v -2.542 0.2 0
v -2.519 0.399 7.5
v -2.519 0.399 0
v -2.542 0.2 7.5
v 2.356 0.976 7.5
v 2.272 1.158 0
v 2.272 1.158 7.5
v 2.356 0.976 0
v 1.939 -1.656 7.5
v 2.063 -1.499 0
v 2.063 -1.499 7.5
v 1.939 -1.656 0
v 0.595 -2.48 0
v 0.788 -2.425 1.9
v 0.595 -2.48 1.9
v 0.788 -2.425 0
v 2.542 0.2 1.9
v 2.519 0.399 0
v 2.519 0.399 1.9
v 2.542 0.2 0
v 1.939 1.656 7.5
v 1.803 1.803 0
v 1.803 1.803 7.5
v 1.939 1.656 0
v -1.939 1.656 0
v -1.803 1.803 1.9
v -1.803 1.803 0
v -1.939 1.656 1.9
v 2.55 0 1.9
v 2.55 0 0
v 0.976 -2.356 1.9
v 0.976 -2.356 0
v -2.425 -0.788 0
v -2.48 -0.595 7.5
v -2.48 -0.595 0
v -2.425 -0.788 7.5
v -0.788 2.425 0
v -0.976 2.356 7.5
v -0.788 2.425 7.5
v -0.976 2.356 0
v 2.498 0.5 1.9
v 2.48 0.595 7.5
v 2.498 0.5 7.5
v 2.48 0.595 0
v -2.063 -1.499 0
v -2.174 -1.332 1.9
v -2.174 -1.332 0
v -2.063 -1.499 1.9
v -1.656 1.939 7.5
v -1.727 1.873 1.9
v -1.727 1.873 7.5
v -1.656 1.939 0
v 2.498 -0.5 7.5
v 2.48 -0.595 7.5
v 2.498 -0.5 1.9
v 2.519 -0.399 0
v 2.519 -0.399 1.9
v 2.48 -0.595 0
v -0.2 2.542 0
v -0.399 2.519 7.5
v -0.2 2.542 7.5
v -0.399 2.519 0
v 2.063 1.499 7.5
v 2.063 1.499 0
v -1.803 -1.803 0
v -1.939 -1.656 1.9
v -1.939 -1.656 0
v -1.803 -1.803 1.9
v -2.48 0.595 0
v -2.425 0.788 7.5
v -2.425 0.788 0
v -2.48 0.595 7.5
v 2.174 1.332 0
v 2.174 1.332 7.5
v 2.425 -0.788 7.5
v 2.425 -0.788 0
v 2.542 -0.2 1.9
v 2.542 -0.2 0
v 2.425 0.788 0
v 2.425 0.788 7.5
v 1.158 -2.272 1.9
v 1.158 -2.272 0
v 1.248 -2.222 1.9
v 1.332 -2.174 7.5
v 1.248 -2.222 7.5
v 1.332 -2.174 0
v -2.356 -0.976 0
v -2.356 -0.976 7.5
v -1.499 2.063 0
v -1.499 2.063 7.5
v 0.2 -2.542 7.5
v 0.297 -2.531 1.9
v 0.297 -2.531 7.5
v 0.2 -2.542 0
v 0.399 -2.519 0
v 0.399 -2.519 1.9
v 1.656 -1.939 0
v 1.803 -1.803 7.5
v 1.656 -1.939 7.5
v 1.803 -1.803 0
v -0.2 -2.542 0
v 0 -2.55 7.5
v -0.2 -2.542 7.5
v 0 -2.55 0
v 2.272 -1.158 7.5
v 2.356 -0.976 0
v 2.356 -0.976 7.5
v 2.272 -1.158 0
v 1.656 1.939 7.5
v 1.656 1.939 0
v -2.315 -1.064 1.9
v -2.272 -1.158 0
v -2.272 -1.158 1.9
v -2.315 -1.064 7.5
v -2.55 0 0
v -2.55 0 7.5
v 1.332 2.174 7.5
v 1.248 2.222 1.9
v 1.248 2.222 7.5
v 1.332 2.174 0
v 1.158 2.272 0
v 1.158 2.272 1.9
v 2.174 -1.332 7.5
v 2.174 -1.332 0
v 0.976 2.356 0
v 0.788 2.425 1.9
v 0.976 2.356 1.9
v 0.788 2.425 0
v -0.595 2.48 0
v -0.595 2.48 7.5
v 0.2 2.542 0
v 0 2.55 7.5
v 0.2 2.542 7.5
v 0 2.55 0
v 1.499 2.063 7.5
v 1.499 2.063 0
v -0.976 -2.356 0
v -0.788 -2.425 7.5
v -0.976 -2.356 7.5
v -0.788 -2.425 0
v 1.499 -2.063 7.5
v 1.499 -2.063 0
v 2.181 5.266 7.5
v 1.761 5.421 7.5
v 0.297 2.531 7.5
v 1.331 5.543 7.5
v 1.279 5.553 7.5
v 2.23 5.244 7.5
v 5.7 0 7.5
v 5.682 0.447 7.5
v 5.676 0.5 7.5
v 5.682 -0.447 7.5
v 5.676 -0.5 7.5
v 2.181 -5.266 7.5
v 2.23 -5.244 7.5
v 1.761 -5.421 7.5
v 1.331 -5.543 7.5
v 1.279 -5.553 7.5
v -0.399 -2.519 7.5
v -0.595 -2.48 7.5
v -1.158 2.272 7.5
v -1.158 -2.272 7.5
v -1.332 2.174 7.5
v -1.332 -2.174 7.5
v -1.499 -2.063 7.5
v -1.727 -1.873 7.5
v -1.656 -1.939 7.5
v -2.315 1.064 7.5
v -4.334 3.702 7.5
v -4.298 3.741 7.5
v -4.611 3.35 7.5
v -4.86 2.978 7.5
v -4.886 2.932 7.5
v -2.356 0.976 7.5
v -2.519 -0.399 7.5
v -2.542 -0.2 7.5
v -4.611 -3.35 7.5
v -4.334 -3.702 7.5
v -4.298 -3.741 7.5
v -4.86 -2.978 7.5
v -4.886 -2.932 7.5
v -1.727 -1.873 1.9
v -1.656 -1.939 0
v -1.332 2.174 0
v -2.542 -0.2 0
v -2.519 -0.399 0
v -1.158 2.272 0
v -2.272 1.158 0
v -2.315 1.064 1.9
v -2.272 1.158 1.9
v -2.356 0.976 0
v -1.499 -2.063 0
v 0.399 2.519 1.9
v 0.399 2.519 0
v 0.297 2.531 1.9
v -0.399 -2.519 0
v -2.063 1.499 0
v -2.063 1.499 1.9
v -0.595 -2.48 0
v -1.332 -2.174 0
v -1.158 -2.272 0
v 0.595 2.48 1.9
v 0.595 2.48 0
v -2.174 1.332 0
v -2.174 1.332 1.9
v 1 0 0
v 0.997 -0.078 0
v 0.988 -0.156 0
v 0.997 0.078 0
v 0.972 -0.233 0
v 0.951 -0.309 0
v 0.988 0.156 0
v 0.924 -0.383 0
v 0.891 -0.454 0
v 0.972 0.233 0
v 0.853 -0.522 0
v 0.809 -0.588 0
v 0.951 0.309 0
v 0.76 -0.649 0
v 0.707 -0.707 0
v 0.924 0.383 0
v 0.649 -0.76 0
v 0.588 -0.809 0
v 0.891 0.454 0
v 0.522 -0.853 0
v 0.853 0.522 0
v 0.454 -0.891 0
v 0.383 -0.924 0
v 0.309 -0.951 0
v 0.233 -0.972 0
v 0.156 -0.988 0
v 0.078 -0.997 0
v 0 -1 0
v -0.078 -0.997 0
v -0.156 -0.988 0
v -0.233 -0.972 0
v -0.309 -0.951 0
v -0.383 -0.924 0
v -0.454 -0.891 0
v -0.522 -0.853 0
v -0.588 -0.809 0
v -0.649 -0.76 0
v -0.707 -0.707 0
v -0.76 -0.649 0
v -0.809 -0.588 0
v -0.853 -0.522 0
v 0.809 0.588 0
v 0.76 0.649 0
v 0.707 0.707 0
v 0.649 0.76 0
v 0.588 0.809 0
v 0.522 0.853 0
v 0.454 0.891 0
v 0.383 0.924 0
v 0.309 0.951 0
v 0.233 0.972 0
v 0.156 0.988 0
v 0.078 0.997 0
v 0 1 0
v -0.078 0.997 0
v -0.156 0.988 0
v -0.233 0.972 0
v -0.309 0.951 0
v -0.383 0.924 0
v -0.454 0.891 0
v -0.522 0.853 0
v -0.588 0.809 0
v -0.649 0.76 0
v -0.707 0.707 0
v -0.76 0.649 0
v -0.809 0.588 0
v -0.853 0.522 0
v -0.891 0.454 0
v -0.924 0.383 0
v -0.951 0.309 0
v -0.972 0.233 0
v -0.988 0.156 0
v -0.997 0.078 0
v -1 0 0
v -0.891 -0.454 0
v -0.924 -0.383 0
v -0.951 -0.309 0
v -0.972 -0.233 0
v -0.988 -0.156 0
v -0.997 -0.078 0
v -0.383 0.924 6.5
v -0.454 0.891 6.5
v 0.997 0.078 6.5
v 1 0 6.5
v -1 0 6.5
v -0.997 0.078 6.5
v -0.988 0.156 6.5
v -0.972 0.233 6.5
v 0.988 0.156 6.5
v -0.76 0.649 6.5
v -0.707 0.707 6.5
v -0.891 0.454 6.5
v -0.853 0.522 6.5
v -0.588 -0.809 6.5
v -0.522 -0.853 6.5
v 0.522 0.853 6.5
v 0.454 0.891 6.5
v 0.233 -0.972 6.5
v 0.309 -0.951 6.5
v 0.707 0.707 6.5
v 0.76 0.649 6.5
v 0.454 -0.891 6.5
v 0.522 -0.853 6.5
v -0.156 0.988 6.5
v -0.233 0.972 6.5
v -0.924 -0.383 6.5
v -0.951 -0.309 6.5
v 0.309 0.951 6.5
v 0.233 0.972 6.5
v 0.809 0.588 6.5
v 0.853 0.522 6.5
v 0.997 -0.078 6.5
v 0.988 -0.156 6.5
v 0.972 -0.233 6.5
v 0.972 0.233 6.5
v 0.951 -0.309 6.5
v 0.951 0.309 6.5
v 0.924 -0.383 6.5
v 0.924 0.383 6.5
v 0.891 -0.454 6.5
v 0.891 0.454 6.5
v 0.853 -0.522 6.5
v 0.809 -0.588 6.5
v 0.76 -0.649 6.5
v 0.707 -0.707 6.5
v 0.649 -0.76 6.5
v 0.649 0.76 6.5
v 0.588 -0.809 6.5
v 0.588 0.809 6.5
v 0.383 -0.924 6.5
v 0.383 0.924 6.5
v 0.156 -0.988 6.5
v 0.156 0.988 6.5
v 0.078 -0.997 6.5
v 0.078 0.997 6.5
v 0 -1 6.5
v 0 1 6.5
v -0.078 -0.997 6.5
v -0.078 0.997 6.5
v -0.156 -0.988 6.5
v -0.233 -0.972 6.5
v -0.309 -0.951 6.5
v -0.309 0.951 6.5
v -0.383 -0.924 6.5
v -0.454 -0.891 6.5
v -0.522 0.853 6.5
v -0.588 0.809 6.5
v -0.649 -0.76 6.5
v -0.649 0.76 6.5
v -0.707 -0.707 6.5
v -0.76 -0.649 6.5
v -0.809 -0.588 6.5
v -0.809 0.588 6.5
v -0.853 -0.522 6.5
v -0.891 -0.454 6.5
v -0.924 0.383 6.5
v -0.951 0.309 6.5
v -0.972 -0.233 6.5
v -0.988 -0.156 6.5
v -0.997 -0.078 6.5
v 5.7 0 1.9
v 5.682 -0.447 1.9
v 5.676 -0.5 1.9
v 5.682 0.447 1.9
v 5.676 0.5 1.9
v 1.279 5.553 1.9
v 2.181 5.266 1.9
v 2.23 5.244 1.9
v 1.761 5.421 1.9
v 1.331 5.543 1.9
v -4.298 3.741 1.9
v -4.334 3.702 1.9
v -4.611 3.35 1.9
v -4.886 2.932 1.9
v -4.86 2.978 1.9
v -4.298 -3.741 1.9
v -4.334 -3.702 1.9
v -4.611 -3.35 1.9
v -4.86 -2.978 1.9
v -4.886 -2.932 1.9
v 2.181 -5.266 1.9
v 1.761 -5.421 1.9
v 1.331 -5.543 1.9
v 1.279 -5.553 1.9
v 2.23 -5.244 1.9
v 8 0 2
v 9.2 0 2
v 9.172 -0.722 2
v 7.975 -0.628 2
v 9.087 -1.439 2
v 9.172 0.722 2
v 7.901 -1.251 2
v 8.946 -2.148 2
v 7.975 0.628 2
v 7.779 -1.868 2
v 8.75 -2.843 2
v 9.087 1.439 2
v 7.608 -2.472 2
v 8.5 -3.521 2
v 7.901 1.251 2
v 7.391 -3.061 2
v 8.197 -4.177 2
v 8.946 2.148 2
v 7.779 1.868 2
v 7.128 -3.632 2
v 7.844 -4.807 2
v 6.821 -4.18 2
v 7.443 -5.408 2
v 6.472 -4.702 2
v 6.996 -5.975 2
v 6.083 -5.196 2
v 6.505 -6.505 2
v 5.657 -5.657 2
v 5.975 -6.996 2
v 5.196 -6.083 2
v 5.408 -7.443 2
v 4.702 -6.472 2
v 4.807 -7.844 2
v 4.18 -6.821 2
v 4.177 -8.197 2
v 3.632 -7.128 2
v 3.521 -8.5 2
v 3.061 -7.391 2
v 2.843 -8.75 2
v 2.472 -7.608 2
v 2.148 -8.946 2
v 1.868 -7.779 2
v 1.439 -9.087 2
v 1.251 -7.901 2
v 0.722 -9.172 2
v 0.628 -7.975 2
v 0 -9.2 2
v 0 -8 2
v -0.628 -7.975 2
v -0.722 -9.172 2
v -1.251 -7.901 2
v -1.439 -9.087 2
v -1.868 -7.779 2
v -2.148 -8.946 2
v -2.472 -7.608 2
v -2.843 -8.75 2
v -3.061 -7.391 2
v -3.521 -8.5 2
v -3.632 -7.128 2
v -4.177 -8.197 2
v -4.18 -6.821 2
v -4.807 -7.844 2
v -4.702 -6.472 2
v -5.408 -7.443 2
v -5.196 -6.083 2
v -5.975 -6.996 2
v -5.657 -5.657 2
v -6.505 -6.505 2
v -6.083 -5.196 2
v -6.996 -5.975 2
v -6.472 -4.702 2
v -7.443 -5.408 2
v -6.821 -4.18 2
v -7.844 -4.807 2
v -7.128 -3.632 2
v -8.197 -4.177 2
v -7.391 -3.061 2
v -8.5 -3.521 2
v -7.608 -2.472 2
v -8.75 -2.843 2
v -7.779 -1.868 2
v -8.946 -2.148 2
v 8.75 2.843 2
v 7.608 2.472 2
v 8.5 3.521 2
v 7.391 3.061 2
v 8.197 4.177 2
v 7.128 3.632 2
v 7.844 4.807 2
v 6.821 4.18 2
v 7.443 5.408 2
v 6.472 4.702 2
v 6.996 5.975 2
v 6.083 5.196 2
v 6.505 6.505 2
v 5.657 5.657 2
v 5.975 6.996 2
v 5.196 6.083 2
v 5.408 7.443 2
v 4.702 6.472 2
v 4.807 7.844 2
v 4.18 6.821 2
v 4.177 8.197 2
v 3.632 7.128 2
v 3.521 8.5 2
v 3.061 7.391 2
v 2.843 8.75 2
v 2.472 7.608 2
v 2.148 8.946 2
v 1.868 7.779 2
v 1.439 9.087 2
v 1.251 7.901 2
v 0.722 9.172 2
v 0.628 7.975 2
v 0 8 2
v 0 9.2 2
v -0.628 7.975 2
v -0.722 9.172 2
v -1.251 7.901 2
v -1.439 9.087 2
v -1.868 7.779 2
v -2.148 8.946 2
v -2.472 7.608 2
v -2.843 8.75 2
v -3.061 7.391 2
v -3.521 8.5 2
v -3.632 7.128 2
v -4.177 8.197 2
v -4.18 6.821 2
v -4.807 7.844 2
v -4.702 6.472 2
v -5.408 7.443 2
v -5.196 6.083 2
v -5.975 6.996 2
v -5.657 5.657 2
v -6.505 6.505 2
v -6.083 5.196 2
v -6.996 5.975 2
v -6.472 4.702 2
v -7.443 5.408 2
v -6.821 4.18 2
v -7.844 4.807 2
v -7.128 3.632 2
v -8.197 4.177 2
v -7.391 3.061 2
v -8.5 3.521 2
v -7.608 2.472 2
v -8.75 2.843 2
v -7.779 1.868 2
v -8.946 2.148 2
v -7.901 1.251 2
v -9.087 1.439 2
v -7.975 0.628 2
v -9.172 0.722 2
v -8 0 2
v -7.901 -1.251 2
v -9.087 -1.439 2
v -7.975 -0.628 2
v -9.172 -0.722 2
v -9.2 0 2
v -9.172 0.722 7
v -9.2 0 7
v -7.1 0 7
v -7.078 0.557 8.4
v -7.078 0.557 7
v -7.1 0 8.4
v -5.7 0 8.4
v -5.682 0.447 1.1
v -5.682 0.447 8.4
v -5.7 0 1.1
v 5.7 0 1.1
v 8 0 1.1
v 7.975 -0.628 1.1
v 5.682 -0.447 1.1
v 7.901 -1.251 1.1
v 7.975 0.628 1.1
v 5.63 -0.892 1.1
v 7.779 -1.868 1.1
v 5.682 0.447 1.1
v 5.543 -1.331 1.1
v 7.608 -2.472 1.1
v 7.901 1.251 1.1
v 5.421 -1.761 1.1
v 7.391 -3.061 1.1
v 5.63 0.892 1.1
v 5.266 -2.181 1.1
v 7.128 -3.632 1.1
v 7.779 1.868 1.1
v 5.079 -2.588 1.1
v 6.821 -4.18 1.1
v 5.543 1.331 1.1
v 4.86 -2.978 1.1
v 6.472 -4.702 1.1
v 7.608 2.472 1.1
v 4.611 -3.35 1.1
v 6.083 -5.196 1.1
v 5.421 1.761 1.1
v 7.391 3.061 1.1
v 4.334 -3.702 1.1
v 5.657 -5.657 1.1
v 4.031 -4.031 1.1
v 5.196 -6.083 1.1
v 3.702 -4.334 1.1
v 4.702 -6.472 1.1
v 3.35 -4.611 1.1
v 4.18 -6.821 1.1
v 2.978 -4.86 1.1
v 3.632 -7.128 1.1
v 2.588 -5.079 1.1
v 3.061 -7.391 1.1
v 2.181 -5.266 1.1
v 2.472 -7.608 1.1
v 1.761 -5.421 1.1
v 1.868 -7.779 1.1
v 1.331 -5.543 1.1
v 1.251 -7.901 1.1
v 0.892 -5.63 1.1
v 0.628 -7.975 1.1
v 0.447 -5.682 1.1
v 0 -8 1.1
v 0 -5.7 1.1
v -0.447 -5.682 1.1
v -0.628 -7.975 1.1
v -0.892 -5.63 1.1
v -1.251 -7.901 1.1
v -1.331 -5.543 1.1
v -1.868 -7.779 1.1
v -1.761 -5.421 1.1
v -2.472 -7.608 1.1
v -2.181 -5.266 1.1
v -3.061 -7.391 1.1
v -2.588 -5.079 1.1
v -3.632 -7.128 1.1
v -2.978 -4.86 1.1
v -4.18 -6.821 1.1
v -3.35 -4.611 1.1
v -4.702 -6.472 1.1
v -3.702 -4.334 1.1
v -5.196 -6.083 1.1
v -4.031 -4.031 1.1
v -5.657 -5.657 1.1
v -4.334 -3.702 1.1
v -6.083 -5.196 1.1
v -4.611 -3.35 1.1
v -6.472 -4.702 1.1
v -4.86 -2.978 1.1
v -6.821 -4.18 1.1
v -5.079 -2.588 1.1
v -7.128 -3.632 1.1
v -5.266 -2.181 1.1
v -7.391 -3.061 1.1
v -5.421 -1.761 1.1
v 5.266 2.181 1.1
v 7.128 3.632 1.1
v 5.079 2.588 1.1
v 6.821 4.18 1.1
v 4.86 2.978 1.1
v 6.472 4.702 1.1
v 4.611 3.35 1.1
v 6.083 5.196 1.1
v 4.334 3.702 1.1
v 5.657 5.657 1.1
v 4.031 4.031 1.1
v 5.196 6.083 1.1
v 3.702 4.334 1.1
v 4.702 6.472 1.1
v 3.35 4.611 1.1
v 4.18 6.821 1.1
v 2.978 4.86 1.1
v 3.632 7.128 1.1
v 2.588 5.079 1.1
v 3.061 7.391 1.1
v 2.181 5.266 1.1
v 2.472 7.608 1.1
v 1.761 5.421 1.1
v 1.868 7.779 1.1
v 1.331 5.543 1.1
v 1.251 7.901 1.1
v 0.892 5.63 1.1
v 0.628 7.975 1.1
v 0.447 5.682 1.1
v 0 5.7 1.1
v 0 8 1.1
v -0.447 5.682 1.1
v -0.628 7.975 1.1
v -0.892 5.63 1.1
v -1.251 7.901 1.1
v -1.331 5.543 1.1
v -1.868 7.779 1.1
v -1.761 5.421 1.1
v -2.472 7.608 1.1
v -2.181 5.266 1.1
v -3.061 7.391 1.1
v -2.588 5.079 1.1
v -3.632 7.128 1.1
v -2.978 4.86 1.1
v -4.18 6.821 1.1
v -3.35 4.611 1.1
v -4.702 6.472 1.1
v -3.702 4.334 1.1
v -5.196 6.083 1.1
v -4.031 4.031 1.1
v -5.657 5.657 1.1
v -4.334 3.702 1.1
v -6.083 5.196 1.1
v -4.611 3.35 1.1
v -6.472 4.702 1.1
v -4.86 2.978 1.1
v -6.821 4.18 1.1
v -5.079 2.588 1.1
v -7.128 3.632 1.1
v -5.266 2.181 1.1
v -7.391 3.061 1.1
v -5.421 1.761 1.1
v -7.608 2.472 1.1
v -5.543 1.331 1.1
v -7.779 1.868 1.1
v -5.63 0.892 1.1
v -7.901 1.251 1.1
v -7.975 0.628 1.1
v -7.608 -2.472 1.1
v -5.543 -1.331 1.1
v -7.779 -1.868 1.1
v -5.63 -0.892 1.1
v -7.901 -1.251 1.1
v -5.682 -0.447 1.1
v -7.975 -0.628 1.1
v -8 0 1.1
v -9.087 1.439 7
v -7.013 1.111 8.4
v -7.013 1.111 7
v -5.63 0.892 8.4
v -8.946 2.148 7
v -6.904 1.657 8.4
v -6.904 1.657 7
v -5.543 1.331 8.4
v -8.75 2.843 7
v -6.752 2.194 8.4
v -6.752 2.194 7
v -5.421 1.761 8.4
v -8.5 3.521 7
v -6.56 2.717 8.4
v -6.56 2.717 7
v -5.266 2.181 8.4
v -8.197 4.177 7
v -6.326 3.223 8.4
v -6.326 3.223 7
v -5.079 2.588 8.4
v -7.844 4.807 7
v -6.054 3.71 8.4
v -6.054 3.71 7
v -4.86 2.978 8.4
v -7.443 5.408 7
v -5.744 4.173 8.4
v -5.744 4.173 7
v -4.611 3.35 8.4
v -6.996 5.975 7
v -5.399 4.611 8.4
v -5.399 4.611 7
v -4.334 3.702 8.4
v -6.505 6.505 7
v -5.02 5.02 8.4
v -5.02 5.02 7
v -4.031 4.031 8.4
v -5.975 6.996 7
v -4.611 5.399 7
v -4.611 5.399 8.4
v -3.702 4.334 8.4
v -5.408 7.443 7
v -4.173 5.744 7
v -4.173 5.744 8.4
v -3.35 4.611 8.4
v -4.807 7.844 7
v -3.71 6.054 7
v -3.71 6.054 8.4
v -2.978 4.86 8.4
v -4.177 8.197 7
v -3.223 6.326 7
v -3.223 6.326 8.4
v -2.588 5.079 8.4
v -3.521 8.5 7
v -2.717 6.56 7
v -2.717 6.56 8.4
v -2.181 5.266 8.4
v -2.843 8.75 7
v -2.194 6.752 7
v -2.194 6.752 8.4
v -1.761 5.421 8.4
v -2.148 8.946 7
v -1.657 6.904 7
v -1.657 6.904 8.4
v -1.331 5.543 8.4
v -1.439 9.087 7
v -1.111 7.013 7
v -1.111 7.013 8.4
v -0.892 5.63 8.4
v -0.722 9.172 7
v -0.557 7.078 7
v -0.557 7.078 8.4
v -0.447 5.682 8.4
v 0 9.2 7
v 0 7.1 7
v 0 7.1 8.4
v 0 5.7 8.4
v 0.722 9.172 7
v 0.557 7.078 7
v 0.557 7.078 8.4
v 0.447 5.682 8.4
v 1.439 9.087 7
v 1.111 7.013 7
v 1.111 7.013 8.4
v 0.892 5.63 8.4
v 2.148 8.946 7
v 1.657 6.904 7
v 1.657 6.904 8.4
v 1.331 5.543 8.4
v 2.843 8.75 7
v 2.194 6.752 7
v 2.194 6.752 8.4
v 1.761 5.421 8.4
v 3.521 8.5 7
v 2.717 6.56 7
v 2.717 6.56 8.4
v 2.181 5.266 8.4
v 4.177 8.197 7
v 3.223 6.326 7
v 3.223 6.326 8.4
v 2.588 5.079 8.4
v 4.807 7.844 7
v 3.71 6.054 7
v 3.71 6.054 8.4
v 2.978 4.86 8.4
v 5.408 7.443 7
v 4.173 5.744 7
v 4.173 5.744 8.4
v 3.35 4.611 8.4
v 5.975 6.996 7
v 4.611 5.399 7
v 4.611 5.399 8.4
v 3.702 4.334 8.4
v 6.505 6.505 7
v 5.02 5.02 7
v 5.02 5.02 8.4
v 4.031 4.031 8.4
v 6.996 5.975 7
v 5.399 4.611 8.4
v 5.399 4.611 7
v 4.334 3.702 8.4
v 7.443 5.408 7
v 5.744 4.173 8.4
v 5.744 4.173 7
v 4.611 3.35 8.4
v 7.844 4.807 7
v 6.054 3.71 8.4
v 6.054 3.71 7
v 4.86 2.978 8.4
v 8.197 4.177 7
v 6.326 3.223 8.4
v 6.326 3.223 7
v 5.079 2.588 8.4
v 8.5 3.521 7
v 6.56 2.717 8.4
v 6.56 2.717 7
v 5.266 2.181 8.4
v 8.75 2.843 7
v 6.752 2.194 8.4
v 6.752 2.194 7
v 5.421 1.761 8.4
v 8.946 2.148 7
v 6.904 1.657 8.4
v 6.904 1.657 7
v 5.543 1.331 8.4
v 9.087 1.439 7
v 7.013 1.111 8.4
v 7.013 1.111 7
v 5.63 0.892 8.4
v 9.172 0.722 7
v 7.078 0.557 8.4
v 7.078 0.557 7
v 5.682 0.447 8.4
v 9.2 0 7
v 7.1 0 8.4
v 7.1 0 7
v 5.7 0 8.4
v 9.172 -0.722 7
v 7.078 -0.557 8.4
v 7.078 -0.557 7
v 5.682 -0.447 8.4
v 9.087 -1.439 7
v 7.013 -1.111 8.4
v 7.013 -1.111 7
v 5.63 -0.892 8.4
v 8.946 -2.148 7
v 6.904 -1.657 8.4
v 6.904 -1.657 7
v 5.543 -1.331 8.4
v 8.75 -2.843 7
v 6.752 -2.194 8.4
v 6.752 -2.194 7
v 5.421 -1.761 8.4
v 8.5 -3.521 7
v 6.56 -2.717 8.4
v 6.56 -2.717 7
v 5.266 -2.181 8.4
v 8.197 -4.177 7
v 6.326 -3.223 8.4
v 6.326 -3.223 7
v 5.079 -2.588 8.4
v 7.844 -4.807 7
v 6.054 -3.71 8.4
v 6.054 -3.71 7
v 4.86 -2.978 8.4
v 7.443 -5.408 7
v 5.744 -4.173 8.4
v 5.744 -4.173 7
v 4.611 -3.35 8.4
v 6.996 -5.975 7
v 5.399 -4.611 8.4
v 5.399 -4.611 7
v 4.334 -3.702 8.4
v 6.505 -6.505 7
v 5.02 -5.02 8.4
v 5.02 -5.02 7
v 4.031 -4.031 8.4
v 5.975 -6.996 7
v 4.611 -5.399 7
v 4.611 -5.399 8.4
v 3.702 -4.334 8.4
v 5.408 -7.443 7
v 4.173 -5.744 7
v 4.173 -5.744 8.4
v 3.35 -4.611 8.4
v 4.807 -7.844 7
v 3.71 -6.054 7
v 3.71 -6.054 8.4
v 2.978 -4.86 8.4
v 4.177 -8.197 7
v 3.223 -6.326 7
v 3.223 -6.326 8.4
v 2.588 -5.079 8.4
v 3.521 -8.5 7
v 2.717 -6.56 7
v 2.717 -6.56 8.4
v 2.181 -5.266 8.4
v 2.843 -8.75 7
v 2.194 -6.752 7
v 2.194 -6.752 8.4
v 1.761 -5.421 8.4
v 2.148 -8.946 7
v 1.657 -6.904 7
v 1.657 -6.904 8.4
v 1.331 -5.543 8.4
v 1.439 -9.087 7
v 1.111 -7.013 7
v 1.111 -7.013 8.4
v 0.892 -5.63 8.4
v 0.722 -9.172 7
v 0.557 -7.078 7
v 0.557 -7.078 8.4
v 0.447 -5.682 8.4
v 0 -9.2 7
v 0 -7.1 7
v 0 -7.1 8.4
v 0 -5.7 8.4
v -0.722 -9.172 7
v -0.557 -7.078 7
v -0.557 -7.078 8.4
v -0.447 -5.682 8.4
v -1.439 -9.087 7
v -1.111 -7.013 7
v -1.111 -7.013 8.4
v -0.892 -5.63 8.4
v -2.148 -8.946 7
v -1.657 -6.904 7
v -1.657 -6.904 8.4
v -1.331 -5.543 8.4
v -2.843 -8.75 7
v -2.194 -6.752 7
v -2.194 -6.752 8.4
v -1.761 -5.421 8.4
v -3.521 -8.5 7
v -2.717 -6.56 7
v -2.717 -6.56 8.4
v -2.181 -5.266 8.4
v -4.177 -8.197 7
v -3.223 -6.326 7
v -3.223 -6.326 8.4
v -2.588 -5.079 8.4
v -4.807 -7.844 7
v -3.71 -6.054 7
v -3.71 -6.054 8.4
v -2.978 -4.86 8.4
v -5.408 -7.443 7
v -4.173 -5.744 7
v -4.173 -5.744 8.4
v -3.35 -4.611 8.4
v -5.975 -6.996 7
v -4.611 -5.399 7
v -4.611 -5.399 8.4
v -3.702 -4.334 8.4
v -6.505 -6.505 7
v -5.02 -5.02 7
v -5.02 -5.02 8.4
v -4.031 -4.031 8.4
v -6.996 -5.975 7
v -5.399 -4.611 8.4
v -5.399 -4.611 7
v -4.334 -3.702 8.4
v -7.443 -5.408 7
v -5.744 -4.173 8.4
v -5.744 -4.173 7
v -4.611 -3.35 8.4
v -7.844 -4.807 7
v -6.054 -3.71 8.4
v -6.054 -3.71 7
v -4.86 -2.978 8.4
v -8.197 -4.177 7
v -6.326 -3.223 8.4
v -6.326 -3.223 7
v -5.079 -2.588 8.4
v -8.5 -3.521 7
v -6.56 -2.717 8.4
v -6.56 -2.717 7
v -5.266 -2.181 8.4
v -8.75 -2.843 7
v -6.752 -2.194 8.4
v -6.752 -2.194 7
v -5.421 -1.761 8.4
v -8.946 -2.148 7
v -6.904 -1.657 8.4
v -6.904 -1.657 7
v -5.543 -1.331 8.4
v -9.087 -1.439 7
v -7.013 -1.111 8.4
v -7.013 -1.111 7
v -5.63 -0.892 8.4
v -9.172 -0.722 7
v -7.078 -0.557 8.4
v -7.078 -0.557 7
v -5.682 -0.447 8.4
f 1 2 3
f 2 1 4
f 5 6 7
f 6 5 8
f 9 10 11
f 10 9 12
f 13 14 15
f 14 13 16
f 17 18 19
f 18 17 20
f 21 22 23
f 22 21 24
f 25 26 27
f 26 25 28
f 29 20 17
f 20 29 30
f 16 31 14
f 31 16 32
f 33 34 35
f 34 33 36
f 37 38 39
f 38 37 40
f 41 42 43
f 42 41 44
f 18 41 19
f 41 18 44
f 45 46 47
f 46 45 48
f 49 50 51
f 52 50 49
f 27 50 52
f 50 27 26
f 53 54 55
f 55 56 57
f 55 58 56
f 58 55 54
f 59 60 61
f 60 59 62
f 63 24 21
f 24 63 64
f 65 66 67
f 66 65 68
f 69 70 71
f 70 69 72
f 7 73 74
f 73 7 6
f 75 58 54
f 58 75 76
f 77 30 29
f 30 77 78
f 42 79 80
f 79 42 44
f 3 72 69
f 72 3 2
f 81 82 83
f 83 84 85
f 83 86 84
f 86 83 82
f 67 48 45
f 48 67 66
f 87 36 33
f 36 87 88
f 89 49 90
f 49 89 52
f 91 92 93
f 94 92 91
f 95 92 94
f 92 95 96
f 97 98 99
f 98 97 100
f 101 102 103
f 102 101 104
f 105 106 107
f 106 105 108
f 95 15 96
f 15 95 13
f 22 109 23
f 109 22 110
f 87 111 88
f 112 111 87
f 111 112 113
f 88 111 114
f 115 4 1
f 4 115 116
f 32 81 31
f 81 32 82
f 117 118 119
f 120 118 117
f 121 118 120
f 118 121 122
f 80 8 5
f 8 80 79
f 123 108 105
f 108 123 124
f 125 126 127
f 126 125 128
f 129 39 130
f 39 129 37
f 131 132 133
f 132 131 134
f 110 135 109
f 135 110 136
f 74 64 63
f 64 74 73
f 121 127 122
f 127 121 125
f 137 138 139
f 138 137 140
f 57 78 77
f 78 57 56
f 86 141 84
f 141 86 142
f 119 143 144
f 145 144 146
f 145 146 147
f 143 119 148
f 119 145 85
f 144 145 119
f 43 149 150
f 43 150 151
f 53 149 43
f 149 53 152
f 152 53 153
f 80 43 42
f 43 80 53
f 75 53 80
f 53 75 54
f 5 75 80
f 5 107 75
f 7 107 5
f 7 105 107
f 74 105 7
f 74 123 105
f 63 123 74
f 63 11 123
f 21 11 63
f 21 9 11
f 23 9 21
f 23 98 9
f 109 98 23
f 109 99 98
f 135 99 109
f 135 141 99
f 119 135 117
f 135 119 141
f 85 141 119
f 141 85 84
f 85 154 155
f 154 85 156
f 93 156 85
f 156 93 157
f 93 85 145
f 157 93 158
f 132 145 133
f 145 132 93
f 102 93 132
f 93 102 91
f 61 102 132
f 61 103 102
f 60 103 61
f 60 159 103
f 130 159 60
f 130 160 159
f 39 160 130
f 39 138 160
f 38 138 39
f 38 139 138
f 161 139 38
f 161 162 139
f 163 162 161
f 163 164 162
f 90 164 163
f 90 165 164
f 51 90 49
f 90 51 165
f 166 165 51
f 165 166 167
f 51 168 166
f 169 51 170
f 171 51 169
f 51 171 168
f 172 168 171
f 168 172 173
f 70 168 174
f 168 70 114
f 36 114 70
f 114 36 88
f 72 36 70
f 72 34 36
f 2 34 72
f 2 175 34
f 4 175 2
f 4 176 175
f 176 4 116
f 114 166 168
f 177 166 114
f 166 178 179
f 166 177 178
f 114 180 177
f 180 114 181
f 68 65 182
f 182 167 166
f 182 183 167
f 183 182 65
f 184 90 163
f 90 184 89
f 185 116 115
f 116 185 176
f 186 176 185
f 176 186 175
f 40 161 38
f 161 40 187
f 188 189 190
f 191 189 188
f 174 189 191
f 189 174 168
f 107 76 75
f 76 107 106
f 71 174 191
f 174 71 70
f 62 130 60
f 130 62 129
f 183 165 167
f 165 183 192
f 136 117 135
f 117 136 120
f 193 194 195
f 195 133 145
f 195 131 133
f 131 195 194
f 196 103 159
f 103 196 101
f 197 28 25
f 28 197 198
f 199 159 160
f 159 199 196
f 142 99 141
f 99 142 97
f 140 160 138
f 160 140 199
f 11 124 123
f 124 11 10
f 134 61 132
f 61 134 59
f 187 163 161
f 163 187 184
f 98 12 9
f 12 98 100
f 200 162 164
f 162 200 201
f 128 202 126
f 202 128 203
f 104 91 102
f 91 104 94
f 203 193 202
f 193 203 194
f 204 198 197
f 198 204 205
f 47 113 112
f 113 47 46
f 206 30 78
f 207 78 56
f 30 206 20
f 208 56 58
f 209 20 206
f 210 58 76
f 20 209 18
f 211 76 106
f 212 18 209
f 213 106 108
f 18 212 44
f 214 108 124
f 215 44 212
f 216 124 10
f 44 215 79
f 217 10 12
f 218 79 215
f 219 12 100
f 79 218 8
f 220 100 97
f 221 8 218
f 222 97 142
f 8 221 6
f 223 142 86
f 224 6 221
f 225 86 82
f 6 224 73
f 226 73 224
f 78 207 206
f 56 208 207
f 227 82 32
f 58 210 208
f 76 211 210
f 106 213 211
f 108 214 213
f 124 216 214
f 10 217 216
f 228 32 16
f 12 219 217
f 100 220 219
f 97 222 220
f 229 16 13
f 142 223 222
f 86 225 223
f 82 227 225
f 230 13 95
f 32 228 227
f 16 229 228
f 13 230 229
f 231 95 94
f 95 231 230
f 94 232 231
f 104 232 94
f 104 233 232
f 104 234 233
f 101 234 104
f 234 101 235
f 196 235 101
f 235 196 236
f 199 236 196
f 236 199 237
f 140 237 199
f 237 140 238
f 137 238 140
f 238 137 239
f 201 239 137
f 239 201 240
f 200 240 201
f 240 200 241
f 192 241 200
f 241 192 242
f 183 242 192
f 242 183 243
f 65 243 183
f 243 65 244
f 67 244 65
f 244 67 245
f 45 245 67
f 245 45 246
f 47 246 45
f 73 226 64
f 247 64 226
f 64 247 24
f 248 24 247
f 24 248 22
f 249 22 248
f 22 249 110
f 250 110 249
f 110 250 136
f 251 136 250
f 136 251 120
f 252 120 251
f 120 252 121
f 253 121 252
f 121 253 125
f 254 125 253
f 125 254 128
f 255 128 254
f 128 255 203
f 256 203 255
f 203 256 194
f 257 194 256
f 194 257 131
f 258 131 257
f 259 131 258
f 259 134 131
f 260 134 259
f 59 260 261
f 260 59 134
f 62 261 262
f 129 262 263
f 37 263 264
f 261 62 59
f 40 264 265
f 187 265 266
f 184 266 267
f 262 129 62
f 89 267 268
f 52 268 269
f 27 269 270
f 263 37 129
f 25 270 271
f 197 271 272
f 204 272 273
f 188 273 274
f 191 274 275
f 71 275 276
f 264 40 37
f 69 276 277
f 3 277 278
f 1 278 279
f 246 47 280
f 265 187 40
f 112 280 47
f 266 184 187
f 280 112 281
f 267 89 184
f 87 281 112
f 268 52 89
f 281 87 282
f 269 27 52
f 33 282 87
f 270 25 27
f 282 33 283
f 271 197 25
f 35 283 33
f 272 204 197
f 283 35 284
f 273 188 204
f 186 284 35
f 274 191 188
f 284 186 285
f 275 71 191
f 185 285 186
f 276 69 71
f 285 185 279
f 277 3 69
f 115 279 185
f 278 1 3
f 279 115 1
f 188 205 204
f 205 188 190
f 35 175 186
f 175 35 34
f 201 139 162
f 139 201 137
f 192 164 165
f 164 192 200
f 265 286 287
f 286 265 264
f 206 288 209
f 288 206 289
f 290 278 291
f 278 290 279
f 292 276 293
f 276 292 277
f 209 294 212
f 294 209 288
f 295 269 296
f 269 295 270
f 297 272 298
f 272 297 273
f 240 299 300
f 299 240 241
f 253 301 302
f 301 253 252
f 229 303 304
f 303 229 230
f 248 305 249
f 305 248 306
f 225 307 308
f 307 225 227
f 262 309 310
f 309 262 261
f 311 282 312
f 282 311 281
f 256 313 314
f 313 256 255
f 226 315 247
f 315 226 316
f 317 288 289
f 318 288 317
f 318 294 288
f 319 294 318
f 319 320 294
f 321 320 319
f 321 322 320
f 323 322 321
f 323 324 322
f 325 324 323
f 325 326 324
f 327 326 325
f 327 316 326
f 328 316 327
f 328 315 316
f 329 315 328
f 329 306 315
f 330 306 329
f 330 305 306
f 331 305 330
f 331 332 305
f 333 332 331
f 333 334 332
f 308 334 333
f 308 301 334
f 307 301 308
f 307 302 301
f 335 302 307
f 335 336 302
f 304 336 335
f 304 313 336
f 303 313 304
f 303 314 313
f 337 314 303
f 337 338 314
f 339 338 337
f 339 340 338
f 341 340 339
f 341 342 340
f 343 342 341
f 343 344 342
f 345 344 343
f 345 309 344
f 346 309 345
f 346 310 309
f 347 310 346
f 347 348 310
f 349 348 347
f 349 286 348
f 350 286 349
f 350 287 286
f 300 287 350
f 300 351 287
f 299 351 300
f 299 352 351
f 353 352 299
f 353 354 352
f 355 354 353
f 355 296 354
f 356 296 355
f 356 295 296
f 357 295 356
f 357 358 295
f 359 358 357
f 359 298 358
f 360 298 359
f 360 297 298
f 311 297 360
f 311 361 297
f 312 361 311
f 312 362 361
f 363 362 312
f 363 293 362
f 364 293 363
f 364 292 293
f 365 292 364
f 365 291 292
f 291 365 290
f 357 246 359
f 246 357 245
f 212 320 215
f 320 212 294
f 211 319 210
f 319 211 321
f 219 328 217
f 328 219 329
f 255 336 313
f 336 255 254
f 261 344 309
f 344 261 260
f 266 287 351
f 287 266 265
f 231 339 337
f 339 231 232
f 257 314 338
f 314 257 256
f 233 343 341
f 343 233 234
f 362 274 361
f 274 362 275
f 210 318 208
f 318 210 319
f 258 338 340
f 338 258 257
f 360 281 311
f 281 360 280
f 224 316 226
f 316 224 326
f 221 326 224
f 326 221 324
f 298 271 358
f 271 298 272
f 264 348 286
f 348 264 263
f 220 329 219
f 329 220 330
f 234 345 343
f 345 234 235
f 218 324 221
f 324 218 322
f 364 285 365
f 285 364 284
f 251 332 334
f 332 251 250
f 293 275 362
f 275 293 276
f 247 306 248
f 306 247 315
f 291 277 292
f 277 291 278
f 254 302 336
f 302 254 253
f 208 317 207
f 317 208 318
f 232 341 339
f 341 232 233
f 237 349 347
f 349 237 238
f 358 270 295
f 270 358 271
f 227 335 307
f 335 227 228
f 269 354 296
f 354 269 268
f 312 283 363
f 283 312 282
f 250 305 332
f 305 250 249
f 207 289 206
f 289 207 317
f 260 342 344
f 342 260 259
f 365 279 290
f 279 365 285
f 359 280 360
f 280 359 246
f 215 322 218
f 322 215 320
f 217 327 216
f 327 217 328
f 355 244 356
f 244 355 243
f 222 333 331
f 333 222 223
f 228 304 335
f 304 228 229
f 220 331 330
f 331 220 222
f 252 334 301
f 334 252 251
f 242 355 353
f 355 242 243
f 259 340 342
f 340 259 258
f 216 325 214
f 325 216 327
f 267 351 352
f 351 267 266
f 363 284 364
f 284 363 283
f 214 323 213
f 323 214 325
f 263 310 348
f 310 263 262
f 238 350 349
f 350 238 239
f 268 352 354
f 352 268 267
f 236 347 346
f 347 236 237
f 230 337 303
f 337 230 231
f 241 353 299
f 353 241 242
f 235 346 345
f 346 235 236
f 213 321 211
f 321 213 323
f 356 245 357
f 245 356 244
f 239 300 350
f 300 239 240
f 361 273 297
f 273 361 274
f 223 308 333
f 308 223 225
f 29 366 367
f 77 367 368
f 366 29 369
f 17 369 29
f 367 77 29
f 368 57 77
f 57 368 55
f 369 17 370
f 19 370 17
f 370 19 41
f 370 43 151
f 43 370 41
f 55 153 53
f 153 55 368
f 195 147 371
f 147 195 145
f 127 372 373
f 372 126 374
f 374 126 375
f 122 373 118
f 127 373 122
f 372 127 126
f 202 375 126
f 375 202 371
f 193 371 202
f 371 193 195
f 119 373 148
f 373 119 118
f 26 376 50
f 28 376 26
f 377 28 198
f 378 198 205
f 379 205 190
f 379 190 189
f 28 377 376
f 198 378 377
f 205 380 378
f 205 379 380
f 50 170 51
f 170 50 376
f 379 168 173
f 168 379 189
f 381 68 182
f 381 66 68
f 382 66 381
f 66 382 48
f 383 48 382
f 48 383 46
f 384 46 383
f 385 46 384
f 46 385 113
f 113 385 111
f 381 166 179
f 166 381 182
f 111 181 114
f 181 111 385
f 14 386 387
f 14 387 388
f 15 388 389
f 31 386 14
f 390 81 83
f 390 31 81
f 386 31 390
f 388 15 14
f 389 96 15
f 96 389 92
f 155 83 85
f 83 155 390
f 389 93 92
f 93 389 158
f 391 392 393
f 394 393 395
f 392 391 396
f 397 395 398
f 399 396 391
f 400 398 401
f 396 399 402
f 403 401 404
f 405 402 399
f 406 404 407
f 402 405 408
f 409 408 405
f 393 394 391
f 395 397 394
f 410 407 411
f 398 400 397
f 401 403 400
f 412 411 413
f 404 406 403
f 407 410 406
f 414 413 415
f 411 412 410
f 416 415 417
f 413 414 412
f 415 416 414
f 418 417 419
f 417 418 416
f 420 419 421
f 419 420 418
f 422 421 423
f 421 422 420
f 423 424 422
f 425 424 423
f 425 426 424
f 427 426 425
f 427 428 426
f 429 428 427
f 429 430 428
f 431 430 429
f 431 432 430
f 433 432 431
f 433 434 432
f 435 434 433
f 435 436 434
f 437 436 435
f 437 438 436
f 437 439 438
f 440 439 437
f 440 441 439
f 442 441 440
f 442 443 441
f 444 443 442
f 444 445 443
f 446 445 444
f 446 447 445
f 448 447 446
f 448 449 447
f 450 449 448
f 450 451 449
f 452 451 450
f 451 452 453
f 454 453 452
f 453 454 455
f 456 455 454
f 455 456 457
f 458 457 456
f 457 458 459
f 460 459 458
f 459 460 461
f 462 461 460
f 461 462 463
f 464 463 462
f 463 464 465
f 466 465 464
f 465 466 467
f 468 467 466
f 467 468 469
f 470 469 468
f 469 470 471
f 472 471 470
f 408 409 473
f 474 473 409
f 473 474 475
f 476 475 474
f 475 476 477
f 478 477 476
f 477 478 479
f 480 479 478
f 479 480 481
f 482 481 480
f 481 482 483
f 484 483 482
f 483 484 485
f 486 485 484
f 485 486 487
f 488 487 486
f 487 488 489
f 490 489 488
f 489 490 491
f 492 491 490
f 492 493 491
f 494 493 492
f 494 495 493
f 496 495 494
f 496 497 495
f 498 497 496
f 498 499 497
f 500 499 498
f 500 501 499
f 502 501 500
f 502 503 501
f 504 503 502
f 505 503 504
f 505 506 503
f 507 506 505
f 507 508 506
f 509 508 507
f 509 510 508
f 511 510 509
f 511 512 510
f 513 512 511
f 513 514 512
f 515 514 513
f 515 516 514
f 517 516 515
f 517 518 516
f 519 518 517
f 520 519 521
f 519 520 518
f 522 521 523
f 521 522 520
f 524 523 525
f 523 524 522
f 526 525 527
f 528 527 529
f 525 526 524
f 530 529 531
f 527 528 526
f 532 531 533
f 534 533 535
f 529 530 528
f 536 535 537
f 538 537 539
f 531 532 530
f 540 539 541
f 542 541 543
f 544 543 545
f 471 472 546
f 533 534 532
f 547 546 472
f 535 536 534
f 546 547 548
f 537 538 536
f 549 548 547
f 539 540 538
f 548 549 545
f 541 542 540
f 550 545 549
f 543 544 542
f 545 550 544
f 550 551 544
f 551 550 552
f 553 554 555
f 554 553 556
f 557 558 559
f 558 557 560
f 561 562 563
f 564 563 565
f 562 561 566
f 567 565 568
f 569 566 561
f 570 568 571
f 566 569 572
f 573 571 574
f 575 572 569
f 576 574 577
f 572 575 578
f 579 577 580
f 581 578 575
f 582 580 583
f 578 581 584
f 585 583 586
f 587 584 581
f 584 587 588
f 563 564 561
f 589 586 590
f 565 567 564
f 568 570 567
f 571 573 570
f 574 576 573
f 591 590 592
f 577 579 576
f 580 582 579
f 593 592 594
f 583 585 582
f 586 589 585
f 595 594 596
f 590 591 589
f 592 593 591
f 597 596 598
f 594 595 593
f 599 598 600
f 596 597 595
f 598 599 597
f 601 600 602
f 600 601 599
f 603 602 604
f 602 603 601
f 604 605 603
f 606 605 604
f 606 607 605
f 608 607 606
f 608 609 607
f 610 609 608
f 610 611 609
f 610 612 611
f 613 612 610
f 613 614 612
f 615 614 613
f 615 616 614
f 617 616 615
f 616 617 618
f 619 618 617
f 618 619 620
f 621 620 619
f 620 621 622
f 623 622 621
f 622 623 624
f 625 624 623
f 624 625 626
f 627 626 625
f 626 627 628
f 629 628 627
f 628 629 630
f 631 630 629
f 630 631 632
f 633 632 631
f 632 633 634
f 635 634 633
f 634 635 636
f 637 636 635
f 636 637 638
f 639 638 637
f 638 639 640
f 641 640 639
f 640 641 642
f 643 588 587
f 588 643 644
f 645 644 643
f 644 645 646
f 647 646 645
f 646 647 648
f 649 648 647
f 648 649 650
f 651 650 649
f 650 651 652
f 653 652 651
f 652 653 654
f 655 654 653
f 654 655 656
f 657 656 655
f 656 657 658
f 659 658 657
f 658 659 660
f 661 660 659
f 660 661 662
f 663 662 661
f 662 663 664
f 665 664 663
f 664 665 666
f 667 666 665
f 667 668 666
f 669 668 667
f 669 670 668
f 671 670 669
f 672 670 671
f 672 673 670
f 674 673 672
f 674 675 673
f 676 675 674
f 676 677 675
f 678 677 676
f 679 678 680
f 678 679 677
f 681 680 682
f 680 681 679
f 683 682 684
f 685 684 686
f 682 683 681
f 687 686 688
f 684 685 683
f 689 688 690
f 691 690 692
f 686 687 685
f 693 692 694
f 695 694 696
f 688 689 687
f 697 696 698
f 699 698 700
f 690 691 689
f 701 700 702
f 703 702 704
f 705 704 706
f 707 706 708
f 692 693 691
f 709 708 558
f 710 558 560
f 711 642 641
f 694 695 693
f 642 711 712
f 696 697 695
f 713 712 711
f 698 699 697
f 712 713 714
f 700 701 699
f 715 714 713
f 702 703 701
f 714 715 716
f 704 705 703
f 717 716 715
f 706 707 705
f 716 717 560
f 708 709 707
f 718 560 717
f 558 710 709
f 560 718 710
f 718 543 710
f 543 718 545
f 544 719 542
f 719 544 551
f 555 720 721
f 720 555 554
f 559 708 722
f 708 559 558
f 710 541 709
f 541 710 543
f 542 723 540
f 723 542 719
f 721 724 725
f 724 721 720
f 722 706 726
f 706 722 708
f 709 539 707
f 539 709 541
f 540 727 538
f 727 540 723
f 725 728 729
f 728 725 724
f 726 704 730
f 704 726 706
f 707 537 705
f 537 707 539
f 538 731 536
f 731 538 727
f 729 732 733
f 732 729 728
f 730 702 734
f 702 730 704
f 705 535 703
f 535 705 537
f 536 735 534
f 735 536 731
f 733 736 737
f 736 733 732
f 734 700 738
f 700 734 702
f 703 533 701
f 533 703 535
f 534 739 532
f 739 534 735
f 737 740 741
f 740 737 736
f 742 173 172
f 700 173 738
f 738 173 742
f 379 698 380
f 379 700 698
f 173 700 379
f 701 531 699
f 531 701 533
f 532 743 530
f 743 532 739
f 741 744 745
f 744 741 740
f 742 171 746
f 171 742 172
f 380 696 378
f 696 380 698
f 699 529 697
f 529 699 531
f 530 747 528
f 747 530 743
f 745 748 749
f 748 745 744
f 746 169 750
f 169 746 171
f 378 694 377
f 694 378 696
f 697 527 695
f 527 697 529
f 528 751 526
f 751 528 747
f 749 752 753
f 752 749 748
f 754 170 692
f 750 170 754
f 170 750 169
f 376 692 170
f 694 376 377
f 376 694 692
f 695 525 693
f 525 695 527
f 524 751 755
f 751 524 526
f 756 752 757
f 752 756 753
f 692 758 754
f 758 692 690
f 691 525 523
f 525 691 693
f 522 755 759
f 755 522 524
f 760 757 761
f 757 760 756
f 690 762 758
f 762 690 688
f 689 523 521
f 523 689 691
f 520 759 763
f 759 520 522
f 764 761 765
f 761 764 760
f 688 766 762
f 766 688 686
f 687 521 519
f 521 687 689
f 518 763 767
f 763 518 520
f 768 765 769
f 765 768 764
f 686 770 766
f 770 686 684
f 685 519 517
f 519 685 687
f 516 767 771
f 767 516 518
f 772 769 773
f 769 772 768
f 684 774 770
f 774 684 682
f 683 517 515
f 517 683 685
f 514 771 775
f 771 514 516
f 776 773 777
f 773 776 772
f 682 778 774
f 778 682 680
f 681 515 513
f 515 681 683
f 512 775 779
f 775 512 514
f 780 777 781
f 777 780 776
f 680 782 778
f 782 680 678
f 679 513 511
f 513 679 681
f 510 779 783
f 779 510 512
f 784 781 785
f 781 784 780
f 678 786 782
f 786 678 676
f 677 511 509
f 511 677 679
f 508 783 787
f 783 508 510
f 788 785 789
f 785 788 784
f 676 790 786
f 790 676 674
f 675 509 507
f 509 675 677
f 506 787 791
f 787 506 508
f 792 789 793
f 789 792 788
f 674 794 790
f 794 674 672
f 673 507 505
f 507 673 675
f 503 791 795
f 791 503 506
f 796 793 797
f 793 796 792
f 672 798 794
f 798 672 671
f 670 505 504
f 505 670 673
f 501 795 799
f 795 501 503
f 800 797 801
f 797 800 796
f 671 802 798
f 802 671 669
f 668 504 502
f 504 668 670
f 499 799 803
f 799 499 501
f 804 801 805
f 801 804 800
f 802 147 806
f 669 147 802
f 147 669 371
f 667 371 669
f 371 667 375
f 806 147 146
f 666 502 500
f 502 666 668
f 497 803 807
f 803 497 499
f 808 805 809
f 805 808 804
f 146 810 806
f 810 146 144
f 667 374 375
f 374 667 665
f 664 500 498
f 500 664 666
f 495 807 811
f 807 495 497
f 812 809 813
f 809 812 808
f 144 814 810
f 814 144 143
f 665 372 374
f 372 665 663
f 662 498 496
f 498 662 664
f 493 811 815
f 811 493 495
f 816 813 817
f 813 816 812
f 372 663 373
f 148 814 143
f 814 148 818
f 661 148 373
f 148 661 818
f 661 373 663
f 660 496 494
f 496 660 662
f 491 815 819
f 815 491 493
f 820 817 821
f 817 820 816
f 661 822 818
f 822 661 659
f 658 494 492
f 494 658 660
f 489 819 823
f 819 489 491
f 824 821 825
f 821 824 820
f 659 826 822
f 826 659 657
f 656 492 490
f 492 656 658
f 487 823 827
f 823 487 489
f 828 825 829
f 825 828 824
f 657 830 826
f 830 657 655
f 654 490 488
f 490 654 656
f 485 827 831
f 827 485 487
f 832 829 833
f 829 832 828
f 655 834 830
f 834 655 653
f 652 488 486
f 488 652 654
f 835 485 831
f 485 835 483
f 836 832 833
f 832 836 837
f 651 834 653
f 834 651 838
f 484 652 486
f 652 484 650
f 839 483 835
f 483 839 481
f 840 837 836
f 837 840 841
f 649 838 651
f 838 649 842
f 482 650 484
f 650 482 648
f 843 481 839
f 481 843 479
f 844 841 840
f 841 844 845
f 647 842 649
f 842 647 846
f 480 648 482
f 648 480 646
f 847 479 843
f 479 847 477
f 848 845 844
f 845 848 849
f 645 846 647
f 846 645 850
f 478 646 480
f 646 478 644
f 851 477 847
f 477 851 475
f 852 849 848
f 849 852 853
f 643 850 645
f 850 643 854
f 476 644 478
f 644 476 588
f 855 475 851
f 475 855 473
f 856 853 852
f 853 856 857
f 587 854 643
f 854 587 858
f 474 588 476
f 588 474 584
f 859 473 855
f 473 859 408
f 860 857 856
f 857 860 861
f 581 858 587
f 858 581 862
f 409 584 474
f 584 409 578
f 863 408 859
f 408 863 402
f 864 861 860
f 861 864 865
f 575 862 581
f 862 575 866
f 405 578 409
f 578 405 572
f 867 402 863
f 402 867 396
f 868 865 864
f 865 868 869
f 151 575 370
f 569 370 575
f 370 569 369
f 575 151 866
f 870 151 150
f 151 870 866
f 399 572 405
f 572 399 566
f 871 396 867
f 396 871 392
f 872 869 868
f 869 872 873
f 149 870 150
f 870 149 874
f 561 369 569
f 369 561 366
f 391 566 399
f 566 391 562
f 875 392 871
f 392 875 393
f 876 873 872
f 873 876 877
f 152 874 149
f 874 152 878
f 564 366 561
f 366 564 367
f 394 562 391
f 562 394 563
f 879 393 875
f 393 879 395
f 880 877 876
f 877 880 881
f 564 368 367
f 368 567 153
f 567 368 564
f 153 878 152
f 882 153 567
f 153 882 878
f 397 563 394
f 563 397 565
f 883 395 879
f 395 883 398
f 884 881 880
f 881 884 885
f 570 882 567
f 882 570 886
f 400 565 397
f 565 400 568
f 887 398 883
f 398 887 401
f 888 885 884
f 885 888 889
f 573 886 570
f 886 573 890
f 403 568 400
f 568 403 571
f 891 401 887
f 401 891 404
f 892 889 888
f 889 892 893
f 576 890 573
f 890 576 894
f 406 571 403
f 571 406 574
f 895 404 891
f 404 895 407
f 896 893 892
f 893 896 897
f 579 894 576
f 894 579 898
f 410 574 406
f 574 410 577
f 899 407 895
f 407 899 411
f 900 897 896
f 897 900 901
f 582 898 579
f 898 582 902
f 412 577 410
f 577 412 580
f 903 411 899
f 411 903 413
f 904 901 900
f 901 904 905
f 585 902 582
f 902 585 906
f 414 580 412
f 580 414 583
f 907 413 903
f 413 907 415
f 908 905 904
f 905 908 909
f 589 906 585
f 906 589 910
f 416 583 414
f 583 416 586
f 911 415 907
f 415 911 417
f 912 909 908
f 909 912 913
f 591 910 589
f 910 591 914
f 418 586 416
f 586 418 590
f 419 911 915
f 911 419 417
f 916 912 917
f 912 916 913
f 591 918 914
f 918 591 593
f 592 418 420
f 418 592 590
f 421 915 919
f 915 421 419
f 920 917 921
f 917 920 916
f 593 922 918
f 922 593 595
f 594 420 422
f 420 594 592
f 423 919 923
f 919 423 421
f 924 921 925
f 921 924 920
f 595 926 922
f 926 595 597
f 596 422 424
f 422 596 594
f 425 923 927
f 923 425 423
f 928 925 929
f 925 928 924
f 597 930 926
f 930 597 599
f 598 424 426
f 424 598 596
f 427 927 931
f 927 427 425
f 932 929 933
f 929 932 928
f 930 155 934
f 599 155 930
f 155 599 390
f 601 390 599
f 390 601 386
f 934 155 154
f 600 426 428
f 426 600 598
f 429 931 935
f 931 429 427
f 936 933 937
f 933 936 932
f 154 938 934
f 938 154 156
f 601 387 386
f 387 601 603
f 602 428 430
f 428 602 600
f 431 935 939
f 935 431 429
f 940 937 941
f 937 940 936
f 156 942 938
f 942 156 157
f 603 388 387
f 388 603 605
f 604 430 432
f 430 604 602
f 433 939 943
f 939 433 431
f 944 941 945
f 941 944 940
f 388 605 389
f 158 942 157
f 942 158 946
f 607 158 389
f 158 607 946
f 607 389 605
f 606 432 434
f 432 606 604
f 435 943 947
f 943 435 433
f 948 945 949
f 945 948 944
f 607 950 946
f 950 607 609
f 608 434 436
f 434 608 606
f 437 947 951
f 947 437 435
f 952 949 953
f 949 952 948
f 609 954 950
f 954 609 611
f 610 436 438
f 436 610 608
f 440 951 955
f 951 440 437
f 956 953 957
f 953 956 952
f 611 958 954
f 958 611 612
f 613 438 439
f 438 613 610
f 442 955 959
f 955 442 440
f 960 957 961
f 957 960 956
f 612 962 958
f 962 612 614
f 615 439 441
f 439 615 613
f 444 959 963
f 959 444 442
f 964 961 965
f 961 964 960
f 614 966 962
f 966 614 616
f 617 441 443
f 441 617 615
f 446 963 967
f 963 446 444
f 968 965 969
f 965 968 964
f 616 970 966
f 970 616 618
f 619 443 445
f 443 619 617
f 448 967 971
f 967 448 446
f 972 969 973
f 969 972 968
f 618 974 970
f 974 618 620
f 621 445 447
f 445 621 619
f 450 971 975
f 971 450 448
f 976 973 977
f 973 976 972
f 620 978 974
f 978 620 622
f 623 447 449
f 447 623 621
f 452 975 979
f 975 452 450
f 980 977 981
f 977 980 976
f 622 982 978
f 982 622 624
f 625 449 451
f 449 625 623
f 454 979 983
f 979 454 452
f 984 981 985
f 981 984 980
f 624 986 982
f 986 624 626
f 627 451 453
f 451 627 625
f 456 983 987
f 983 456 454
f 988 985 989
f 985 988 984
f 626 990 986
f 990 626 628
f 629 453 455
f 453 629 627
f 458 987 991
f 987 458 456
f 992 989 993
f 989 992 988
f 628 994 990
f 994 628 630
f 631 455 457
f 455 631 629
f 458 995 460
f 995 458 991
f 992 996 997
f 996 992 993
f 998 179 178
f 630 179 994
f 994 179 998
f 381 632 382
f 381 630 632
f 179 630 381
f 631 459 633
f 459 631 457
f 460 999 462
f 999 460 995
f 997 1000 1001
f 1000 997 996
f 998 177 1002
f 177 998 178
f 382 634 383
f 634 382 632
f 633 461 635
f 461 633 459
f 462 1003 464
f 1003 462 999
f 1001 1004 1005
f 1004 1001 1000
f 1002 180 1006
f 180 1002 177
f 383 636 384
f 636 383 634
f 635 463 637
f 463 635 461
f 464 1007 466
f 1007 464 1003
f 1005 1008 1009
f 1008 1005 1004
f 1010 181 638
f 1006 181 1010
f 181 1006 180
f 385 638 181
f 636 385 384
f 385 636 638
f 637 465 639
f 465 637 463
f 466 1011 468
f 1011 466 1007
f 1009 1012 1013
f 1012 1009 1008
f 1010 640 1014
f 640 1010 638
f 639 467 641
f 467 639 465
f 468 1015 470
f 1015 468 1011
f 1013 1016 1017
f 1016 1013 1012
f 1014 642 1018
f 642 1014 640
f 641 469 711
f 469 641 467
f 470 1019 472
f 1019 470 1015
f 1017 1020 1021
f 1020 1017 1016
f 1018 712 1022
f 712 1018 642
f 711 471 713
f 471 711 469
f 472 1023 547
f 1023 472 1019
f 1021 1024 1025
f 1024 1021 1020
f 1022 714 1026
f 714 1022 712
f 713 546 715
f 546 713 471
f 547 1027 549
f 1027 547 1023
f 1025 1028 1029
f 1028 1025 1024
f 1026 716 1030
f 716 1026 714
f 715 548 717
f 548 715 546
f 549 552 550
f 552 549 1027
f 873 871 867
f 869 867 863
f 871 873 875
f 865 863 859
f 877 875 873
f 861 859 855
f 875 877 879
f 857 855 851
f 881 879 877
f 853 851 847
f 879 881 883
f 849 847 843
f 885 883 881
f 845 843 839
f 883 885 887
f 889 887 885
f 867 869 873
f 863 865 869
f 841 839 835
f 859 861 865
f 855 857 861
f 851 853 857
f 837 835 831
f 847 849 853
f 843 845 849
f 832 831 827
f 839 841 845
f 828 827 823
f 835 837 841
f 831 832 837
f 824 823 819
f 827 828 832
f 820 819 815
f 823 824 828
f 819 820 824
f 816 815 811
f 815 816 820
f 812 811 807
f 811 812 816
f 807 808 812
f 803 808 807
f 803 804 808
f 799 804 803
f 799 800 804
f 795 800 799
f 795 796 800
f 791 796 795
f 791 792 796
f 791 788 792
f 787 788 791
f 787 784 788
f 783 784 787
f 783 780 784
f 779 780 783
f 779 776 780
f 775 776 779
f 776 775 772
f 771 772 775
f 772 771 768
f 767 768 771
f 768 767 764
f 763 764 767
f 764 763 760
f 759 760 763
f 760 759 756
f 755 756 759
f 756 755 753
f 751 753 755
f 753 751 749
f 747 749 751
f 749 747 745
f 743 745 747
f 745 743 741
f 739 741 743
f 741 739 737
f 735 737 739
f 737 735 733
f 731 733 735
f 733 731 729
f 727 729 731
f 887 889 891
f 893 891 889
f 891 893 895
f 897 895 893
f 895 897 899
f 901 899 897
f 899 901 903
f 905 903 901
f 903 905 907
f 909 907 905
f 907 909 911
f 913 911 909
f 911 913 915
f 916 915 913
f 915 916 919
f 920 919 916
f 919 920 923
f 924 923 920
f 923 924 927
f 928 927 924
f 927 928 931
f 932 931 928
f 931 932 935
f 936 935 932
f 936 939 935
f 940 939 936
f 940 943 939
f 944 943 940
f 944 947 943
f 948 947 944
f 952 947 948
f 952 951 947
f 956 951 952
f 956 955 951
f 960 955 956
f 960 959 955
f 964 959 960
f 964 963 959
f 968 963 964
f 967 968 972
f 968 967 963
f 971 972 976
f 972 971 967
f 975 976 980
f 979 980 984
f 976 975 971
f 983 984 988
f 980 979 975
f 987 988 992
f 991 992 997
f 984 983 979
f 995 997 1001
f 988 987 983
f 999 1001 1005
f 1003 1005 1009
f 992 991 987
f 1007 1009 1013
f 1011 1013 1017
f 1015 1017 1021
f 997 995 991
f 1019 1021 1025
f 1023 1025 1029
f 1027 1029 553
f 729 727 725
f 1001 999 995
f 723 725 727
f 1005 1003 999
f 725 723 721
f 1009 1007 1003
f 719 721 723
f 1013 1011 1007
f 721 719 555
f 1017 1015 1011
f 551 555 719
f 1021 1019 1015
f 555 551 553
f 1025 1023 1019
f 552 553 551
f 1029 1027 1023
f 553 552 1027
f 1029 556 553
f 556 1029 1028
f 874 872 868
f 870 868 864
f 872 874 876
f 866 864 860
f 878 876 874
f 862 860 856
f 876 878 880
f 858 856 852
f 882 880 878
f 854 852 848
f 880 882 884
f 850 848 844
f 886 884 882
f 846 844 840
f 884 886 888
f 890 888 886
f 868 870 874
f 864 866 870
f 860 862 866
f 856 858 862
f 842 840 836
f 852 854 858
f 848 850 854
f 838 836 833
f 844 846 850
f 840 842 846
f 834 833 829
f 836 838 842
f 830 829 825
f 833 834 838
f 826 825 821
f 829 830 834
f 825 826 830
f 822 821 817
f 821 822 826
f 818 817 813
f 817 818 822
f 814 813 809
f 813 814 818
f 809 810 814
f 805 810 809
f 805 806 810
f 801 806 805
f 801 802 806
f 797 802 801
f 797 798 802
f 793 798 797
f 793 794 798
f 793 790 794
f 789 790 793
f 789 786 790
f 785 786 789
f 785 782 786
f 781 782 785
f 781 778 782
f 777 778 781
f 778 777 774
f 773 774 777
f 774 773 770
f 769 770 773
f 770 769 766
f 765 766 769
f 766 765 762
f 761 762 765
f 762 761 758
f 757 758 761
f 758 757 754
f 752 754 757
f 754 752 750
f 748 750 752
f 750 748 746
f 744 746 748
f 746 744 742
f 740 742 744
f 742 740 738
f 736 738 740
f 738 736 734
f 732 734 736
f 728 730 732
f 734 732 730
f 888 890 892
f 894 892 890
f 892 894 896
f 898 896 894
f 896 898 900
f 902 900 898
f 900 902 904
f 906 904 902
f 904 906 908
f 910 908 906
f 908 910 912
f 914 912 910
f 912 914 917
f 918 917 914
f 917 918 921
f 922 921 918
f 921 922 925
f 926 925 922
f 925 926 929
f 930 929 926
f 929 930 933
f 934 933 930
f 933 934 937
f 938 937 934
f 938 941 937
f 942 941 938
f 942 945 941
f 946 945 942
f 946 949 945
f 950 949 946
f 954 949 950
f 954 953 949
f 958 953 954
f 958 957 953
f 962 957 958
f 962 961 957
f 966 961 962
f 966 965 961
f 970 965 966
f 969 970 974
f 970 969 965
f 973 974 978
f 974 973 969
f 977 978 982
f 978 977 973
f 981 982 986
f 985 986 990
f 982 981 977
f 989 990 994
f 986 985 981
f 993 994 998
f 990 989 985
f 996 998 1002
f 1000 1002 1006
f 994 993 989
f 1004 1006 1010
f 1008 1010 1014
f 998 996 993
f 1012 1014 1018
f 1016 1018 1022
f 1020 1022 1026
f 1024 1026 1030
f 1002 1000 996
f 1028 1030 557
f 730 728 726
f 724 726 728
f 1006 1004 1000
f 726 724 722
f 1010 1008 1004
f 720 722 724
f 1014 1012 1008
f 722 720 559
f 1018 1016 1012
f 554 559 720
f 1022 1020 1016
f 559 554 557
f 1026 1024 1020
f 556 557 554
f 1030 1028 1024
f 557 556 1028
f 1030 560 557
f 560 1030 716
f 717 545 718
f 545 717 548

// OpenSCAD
difference () {
    cylinder(h=7.5, d=5.1, $fn=80);
    translate([0,0,-0.05])
        cylinder(h=6.55, d=2, $fn=80);
    };
    
rotate_extrude ($fn=80)
    translate([5.7, 1.1,0])
        polygon([[0,0],[2.3,0],[2.3,0.9],[3.5,0.9],[3.5,5.9],[1.4,5.9],[1.4,7.3],[0,7.3]]);
    
module ray () {
    translate([2.4, -0.5, 1.9])
        cube([3.4, 1, 5.6]);
}

for (a = [ 0 : 1 : 4 ])
    rotate([0, 0, a * 72])
        ray();
